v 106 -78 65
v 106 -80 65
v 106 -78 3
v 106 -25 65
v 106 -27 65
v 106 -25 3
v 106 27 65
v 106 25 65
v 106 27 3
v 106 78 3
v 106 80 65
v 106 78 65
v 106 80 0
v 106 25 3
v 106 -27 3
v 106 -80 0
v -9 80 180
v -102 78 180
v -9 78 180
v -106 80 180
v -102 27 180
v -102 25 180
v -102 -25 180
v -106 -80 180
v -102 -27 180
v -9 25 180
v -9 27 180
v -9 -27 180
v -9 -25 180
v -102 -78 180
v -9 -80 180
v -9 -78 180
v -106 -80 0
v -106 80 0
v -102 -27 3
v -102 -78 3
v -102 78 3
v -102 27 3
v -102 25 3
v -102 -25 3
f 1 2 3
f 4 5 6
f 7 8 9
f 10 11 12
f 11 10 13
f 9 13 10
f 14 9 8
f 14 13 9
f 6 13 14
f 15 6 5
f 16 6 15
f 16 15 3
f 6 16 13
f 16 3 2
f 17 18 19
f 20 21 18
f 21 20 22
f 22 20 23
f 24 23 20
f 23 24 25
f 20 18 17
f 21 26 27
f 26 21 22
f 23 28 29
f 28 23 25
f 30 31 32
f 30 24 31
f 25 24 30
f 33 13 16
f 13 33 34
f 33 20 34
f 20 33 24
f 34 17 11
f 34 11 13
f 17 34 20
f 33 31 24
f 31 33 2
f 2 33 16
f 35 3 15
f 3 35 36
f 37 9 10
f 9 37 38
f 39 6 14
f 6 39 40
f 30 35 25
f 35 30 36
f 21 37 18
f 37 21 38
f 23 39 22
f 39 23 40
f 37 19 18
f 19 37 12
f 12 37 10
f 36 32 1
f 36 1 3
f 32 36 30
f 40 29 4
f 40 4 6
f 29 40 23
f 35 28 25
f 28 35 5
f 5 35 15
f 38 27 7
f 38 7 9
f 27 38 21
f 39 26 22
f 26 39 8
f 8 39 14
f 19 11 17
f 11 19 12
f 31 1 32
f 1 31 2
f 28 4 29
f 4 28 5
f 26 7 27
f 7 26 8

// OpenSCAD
include <MCAD/boxes.scad>

//Customizable magazine paper organizer


/* [Outside Box Dimensions] */
//Depth (Paper or mazine width width)
Depth=212; 
//Width 
Width=160; 
//Height 
Height=180;


//Y Dividers (0 for no dividers)
row=3; 
//Divider Wall Thickness
divWall=2;
//Chamfer angle
chamferAngle=45;


/* [Wall Thickness] */
//Wall Thickness (min: 2mm)
wall=2;



/* [Hidden] */
boxDim=[Depth, Width, Height]; 
over=0; //amount to extend parts that need to have interference (such as dividers)
//Chamfer size
chamfer=Height;



module xDiv(inSide){
  xInc=inSide[0]/col;
  for ( i = [1 : col-1] ) {
    translate([i*xInc, 0, 0])cube([divWall, inSide[1]+over, inSide[2]+over], center=true);
  }
}


module yDiv(inSide){
  yInc=inSide[1]/row;
  echo("Tool width:",yInc);
  for (i = [1 : row-1] ) {
	translate([0, i*yInc, 0])cube([inSide[0]+wall, divWall, inSide[2]+wall], center=true);
  }
}

module drawBox () {
  innerBox=[Depth-wall, Width-(2*wall), Height-wall];
  echo("innerBox=", innerBox);
  difference(){
		union() {
			difference() {
			  roundedBox(boxDim, 0, 1, $fn=36);
			  translate([wall+1,0,wall])roundedBox(innerBox, 0, 1, $fn=20);
			}
			translate([0, -innerBox[1]/2, 0]) yDiv(innerBox);
		}
		translate([boxDim[0]/2+5,-boxDim[1]/2-5,-30])rotate([0,-chamferAngle,0])cube([chamfer, boxDim[1]+10, boxDim[2]*2], center=false);	
	}
	//
	
}

module assemble() {
    translate([0,0,boxDim[2]/2])drawBox();
}

assemble();
